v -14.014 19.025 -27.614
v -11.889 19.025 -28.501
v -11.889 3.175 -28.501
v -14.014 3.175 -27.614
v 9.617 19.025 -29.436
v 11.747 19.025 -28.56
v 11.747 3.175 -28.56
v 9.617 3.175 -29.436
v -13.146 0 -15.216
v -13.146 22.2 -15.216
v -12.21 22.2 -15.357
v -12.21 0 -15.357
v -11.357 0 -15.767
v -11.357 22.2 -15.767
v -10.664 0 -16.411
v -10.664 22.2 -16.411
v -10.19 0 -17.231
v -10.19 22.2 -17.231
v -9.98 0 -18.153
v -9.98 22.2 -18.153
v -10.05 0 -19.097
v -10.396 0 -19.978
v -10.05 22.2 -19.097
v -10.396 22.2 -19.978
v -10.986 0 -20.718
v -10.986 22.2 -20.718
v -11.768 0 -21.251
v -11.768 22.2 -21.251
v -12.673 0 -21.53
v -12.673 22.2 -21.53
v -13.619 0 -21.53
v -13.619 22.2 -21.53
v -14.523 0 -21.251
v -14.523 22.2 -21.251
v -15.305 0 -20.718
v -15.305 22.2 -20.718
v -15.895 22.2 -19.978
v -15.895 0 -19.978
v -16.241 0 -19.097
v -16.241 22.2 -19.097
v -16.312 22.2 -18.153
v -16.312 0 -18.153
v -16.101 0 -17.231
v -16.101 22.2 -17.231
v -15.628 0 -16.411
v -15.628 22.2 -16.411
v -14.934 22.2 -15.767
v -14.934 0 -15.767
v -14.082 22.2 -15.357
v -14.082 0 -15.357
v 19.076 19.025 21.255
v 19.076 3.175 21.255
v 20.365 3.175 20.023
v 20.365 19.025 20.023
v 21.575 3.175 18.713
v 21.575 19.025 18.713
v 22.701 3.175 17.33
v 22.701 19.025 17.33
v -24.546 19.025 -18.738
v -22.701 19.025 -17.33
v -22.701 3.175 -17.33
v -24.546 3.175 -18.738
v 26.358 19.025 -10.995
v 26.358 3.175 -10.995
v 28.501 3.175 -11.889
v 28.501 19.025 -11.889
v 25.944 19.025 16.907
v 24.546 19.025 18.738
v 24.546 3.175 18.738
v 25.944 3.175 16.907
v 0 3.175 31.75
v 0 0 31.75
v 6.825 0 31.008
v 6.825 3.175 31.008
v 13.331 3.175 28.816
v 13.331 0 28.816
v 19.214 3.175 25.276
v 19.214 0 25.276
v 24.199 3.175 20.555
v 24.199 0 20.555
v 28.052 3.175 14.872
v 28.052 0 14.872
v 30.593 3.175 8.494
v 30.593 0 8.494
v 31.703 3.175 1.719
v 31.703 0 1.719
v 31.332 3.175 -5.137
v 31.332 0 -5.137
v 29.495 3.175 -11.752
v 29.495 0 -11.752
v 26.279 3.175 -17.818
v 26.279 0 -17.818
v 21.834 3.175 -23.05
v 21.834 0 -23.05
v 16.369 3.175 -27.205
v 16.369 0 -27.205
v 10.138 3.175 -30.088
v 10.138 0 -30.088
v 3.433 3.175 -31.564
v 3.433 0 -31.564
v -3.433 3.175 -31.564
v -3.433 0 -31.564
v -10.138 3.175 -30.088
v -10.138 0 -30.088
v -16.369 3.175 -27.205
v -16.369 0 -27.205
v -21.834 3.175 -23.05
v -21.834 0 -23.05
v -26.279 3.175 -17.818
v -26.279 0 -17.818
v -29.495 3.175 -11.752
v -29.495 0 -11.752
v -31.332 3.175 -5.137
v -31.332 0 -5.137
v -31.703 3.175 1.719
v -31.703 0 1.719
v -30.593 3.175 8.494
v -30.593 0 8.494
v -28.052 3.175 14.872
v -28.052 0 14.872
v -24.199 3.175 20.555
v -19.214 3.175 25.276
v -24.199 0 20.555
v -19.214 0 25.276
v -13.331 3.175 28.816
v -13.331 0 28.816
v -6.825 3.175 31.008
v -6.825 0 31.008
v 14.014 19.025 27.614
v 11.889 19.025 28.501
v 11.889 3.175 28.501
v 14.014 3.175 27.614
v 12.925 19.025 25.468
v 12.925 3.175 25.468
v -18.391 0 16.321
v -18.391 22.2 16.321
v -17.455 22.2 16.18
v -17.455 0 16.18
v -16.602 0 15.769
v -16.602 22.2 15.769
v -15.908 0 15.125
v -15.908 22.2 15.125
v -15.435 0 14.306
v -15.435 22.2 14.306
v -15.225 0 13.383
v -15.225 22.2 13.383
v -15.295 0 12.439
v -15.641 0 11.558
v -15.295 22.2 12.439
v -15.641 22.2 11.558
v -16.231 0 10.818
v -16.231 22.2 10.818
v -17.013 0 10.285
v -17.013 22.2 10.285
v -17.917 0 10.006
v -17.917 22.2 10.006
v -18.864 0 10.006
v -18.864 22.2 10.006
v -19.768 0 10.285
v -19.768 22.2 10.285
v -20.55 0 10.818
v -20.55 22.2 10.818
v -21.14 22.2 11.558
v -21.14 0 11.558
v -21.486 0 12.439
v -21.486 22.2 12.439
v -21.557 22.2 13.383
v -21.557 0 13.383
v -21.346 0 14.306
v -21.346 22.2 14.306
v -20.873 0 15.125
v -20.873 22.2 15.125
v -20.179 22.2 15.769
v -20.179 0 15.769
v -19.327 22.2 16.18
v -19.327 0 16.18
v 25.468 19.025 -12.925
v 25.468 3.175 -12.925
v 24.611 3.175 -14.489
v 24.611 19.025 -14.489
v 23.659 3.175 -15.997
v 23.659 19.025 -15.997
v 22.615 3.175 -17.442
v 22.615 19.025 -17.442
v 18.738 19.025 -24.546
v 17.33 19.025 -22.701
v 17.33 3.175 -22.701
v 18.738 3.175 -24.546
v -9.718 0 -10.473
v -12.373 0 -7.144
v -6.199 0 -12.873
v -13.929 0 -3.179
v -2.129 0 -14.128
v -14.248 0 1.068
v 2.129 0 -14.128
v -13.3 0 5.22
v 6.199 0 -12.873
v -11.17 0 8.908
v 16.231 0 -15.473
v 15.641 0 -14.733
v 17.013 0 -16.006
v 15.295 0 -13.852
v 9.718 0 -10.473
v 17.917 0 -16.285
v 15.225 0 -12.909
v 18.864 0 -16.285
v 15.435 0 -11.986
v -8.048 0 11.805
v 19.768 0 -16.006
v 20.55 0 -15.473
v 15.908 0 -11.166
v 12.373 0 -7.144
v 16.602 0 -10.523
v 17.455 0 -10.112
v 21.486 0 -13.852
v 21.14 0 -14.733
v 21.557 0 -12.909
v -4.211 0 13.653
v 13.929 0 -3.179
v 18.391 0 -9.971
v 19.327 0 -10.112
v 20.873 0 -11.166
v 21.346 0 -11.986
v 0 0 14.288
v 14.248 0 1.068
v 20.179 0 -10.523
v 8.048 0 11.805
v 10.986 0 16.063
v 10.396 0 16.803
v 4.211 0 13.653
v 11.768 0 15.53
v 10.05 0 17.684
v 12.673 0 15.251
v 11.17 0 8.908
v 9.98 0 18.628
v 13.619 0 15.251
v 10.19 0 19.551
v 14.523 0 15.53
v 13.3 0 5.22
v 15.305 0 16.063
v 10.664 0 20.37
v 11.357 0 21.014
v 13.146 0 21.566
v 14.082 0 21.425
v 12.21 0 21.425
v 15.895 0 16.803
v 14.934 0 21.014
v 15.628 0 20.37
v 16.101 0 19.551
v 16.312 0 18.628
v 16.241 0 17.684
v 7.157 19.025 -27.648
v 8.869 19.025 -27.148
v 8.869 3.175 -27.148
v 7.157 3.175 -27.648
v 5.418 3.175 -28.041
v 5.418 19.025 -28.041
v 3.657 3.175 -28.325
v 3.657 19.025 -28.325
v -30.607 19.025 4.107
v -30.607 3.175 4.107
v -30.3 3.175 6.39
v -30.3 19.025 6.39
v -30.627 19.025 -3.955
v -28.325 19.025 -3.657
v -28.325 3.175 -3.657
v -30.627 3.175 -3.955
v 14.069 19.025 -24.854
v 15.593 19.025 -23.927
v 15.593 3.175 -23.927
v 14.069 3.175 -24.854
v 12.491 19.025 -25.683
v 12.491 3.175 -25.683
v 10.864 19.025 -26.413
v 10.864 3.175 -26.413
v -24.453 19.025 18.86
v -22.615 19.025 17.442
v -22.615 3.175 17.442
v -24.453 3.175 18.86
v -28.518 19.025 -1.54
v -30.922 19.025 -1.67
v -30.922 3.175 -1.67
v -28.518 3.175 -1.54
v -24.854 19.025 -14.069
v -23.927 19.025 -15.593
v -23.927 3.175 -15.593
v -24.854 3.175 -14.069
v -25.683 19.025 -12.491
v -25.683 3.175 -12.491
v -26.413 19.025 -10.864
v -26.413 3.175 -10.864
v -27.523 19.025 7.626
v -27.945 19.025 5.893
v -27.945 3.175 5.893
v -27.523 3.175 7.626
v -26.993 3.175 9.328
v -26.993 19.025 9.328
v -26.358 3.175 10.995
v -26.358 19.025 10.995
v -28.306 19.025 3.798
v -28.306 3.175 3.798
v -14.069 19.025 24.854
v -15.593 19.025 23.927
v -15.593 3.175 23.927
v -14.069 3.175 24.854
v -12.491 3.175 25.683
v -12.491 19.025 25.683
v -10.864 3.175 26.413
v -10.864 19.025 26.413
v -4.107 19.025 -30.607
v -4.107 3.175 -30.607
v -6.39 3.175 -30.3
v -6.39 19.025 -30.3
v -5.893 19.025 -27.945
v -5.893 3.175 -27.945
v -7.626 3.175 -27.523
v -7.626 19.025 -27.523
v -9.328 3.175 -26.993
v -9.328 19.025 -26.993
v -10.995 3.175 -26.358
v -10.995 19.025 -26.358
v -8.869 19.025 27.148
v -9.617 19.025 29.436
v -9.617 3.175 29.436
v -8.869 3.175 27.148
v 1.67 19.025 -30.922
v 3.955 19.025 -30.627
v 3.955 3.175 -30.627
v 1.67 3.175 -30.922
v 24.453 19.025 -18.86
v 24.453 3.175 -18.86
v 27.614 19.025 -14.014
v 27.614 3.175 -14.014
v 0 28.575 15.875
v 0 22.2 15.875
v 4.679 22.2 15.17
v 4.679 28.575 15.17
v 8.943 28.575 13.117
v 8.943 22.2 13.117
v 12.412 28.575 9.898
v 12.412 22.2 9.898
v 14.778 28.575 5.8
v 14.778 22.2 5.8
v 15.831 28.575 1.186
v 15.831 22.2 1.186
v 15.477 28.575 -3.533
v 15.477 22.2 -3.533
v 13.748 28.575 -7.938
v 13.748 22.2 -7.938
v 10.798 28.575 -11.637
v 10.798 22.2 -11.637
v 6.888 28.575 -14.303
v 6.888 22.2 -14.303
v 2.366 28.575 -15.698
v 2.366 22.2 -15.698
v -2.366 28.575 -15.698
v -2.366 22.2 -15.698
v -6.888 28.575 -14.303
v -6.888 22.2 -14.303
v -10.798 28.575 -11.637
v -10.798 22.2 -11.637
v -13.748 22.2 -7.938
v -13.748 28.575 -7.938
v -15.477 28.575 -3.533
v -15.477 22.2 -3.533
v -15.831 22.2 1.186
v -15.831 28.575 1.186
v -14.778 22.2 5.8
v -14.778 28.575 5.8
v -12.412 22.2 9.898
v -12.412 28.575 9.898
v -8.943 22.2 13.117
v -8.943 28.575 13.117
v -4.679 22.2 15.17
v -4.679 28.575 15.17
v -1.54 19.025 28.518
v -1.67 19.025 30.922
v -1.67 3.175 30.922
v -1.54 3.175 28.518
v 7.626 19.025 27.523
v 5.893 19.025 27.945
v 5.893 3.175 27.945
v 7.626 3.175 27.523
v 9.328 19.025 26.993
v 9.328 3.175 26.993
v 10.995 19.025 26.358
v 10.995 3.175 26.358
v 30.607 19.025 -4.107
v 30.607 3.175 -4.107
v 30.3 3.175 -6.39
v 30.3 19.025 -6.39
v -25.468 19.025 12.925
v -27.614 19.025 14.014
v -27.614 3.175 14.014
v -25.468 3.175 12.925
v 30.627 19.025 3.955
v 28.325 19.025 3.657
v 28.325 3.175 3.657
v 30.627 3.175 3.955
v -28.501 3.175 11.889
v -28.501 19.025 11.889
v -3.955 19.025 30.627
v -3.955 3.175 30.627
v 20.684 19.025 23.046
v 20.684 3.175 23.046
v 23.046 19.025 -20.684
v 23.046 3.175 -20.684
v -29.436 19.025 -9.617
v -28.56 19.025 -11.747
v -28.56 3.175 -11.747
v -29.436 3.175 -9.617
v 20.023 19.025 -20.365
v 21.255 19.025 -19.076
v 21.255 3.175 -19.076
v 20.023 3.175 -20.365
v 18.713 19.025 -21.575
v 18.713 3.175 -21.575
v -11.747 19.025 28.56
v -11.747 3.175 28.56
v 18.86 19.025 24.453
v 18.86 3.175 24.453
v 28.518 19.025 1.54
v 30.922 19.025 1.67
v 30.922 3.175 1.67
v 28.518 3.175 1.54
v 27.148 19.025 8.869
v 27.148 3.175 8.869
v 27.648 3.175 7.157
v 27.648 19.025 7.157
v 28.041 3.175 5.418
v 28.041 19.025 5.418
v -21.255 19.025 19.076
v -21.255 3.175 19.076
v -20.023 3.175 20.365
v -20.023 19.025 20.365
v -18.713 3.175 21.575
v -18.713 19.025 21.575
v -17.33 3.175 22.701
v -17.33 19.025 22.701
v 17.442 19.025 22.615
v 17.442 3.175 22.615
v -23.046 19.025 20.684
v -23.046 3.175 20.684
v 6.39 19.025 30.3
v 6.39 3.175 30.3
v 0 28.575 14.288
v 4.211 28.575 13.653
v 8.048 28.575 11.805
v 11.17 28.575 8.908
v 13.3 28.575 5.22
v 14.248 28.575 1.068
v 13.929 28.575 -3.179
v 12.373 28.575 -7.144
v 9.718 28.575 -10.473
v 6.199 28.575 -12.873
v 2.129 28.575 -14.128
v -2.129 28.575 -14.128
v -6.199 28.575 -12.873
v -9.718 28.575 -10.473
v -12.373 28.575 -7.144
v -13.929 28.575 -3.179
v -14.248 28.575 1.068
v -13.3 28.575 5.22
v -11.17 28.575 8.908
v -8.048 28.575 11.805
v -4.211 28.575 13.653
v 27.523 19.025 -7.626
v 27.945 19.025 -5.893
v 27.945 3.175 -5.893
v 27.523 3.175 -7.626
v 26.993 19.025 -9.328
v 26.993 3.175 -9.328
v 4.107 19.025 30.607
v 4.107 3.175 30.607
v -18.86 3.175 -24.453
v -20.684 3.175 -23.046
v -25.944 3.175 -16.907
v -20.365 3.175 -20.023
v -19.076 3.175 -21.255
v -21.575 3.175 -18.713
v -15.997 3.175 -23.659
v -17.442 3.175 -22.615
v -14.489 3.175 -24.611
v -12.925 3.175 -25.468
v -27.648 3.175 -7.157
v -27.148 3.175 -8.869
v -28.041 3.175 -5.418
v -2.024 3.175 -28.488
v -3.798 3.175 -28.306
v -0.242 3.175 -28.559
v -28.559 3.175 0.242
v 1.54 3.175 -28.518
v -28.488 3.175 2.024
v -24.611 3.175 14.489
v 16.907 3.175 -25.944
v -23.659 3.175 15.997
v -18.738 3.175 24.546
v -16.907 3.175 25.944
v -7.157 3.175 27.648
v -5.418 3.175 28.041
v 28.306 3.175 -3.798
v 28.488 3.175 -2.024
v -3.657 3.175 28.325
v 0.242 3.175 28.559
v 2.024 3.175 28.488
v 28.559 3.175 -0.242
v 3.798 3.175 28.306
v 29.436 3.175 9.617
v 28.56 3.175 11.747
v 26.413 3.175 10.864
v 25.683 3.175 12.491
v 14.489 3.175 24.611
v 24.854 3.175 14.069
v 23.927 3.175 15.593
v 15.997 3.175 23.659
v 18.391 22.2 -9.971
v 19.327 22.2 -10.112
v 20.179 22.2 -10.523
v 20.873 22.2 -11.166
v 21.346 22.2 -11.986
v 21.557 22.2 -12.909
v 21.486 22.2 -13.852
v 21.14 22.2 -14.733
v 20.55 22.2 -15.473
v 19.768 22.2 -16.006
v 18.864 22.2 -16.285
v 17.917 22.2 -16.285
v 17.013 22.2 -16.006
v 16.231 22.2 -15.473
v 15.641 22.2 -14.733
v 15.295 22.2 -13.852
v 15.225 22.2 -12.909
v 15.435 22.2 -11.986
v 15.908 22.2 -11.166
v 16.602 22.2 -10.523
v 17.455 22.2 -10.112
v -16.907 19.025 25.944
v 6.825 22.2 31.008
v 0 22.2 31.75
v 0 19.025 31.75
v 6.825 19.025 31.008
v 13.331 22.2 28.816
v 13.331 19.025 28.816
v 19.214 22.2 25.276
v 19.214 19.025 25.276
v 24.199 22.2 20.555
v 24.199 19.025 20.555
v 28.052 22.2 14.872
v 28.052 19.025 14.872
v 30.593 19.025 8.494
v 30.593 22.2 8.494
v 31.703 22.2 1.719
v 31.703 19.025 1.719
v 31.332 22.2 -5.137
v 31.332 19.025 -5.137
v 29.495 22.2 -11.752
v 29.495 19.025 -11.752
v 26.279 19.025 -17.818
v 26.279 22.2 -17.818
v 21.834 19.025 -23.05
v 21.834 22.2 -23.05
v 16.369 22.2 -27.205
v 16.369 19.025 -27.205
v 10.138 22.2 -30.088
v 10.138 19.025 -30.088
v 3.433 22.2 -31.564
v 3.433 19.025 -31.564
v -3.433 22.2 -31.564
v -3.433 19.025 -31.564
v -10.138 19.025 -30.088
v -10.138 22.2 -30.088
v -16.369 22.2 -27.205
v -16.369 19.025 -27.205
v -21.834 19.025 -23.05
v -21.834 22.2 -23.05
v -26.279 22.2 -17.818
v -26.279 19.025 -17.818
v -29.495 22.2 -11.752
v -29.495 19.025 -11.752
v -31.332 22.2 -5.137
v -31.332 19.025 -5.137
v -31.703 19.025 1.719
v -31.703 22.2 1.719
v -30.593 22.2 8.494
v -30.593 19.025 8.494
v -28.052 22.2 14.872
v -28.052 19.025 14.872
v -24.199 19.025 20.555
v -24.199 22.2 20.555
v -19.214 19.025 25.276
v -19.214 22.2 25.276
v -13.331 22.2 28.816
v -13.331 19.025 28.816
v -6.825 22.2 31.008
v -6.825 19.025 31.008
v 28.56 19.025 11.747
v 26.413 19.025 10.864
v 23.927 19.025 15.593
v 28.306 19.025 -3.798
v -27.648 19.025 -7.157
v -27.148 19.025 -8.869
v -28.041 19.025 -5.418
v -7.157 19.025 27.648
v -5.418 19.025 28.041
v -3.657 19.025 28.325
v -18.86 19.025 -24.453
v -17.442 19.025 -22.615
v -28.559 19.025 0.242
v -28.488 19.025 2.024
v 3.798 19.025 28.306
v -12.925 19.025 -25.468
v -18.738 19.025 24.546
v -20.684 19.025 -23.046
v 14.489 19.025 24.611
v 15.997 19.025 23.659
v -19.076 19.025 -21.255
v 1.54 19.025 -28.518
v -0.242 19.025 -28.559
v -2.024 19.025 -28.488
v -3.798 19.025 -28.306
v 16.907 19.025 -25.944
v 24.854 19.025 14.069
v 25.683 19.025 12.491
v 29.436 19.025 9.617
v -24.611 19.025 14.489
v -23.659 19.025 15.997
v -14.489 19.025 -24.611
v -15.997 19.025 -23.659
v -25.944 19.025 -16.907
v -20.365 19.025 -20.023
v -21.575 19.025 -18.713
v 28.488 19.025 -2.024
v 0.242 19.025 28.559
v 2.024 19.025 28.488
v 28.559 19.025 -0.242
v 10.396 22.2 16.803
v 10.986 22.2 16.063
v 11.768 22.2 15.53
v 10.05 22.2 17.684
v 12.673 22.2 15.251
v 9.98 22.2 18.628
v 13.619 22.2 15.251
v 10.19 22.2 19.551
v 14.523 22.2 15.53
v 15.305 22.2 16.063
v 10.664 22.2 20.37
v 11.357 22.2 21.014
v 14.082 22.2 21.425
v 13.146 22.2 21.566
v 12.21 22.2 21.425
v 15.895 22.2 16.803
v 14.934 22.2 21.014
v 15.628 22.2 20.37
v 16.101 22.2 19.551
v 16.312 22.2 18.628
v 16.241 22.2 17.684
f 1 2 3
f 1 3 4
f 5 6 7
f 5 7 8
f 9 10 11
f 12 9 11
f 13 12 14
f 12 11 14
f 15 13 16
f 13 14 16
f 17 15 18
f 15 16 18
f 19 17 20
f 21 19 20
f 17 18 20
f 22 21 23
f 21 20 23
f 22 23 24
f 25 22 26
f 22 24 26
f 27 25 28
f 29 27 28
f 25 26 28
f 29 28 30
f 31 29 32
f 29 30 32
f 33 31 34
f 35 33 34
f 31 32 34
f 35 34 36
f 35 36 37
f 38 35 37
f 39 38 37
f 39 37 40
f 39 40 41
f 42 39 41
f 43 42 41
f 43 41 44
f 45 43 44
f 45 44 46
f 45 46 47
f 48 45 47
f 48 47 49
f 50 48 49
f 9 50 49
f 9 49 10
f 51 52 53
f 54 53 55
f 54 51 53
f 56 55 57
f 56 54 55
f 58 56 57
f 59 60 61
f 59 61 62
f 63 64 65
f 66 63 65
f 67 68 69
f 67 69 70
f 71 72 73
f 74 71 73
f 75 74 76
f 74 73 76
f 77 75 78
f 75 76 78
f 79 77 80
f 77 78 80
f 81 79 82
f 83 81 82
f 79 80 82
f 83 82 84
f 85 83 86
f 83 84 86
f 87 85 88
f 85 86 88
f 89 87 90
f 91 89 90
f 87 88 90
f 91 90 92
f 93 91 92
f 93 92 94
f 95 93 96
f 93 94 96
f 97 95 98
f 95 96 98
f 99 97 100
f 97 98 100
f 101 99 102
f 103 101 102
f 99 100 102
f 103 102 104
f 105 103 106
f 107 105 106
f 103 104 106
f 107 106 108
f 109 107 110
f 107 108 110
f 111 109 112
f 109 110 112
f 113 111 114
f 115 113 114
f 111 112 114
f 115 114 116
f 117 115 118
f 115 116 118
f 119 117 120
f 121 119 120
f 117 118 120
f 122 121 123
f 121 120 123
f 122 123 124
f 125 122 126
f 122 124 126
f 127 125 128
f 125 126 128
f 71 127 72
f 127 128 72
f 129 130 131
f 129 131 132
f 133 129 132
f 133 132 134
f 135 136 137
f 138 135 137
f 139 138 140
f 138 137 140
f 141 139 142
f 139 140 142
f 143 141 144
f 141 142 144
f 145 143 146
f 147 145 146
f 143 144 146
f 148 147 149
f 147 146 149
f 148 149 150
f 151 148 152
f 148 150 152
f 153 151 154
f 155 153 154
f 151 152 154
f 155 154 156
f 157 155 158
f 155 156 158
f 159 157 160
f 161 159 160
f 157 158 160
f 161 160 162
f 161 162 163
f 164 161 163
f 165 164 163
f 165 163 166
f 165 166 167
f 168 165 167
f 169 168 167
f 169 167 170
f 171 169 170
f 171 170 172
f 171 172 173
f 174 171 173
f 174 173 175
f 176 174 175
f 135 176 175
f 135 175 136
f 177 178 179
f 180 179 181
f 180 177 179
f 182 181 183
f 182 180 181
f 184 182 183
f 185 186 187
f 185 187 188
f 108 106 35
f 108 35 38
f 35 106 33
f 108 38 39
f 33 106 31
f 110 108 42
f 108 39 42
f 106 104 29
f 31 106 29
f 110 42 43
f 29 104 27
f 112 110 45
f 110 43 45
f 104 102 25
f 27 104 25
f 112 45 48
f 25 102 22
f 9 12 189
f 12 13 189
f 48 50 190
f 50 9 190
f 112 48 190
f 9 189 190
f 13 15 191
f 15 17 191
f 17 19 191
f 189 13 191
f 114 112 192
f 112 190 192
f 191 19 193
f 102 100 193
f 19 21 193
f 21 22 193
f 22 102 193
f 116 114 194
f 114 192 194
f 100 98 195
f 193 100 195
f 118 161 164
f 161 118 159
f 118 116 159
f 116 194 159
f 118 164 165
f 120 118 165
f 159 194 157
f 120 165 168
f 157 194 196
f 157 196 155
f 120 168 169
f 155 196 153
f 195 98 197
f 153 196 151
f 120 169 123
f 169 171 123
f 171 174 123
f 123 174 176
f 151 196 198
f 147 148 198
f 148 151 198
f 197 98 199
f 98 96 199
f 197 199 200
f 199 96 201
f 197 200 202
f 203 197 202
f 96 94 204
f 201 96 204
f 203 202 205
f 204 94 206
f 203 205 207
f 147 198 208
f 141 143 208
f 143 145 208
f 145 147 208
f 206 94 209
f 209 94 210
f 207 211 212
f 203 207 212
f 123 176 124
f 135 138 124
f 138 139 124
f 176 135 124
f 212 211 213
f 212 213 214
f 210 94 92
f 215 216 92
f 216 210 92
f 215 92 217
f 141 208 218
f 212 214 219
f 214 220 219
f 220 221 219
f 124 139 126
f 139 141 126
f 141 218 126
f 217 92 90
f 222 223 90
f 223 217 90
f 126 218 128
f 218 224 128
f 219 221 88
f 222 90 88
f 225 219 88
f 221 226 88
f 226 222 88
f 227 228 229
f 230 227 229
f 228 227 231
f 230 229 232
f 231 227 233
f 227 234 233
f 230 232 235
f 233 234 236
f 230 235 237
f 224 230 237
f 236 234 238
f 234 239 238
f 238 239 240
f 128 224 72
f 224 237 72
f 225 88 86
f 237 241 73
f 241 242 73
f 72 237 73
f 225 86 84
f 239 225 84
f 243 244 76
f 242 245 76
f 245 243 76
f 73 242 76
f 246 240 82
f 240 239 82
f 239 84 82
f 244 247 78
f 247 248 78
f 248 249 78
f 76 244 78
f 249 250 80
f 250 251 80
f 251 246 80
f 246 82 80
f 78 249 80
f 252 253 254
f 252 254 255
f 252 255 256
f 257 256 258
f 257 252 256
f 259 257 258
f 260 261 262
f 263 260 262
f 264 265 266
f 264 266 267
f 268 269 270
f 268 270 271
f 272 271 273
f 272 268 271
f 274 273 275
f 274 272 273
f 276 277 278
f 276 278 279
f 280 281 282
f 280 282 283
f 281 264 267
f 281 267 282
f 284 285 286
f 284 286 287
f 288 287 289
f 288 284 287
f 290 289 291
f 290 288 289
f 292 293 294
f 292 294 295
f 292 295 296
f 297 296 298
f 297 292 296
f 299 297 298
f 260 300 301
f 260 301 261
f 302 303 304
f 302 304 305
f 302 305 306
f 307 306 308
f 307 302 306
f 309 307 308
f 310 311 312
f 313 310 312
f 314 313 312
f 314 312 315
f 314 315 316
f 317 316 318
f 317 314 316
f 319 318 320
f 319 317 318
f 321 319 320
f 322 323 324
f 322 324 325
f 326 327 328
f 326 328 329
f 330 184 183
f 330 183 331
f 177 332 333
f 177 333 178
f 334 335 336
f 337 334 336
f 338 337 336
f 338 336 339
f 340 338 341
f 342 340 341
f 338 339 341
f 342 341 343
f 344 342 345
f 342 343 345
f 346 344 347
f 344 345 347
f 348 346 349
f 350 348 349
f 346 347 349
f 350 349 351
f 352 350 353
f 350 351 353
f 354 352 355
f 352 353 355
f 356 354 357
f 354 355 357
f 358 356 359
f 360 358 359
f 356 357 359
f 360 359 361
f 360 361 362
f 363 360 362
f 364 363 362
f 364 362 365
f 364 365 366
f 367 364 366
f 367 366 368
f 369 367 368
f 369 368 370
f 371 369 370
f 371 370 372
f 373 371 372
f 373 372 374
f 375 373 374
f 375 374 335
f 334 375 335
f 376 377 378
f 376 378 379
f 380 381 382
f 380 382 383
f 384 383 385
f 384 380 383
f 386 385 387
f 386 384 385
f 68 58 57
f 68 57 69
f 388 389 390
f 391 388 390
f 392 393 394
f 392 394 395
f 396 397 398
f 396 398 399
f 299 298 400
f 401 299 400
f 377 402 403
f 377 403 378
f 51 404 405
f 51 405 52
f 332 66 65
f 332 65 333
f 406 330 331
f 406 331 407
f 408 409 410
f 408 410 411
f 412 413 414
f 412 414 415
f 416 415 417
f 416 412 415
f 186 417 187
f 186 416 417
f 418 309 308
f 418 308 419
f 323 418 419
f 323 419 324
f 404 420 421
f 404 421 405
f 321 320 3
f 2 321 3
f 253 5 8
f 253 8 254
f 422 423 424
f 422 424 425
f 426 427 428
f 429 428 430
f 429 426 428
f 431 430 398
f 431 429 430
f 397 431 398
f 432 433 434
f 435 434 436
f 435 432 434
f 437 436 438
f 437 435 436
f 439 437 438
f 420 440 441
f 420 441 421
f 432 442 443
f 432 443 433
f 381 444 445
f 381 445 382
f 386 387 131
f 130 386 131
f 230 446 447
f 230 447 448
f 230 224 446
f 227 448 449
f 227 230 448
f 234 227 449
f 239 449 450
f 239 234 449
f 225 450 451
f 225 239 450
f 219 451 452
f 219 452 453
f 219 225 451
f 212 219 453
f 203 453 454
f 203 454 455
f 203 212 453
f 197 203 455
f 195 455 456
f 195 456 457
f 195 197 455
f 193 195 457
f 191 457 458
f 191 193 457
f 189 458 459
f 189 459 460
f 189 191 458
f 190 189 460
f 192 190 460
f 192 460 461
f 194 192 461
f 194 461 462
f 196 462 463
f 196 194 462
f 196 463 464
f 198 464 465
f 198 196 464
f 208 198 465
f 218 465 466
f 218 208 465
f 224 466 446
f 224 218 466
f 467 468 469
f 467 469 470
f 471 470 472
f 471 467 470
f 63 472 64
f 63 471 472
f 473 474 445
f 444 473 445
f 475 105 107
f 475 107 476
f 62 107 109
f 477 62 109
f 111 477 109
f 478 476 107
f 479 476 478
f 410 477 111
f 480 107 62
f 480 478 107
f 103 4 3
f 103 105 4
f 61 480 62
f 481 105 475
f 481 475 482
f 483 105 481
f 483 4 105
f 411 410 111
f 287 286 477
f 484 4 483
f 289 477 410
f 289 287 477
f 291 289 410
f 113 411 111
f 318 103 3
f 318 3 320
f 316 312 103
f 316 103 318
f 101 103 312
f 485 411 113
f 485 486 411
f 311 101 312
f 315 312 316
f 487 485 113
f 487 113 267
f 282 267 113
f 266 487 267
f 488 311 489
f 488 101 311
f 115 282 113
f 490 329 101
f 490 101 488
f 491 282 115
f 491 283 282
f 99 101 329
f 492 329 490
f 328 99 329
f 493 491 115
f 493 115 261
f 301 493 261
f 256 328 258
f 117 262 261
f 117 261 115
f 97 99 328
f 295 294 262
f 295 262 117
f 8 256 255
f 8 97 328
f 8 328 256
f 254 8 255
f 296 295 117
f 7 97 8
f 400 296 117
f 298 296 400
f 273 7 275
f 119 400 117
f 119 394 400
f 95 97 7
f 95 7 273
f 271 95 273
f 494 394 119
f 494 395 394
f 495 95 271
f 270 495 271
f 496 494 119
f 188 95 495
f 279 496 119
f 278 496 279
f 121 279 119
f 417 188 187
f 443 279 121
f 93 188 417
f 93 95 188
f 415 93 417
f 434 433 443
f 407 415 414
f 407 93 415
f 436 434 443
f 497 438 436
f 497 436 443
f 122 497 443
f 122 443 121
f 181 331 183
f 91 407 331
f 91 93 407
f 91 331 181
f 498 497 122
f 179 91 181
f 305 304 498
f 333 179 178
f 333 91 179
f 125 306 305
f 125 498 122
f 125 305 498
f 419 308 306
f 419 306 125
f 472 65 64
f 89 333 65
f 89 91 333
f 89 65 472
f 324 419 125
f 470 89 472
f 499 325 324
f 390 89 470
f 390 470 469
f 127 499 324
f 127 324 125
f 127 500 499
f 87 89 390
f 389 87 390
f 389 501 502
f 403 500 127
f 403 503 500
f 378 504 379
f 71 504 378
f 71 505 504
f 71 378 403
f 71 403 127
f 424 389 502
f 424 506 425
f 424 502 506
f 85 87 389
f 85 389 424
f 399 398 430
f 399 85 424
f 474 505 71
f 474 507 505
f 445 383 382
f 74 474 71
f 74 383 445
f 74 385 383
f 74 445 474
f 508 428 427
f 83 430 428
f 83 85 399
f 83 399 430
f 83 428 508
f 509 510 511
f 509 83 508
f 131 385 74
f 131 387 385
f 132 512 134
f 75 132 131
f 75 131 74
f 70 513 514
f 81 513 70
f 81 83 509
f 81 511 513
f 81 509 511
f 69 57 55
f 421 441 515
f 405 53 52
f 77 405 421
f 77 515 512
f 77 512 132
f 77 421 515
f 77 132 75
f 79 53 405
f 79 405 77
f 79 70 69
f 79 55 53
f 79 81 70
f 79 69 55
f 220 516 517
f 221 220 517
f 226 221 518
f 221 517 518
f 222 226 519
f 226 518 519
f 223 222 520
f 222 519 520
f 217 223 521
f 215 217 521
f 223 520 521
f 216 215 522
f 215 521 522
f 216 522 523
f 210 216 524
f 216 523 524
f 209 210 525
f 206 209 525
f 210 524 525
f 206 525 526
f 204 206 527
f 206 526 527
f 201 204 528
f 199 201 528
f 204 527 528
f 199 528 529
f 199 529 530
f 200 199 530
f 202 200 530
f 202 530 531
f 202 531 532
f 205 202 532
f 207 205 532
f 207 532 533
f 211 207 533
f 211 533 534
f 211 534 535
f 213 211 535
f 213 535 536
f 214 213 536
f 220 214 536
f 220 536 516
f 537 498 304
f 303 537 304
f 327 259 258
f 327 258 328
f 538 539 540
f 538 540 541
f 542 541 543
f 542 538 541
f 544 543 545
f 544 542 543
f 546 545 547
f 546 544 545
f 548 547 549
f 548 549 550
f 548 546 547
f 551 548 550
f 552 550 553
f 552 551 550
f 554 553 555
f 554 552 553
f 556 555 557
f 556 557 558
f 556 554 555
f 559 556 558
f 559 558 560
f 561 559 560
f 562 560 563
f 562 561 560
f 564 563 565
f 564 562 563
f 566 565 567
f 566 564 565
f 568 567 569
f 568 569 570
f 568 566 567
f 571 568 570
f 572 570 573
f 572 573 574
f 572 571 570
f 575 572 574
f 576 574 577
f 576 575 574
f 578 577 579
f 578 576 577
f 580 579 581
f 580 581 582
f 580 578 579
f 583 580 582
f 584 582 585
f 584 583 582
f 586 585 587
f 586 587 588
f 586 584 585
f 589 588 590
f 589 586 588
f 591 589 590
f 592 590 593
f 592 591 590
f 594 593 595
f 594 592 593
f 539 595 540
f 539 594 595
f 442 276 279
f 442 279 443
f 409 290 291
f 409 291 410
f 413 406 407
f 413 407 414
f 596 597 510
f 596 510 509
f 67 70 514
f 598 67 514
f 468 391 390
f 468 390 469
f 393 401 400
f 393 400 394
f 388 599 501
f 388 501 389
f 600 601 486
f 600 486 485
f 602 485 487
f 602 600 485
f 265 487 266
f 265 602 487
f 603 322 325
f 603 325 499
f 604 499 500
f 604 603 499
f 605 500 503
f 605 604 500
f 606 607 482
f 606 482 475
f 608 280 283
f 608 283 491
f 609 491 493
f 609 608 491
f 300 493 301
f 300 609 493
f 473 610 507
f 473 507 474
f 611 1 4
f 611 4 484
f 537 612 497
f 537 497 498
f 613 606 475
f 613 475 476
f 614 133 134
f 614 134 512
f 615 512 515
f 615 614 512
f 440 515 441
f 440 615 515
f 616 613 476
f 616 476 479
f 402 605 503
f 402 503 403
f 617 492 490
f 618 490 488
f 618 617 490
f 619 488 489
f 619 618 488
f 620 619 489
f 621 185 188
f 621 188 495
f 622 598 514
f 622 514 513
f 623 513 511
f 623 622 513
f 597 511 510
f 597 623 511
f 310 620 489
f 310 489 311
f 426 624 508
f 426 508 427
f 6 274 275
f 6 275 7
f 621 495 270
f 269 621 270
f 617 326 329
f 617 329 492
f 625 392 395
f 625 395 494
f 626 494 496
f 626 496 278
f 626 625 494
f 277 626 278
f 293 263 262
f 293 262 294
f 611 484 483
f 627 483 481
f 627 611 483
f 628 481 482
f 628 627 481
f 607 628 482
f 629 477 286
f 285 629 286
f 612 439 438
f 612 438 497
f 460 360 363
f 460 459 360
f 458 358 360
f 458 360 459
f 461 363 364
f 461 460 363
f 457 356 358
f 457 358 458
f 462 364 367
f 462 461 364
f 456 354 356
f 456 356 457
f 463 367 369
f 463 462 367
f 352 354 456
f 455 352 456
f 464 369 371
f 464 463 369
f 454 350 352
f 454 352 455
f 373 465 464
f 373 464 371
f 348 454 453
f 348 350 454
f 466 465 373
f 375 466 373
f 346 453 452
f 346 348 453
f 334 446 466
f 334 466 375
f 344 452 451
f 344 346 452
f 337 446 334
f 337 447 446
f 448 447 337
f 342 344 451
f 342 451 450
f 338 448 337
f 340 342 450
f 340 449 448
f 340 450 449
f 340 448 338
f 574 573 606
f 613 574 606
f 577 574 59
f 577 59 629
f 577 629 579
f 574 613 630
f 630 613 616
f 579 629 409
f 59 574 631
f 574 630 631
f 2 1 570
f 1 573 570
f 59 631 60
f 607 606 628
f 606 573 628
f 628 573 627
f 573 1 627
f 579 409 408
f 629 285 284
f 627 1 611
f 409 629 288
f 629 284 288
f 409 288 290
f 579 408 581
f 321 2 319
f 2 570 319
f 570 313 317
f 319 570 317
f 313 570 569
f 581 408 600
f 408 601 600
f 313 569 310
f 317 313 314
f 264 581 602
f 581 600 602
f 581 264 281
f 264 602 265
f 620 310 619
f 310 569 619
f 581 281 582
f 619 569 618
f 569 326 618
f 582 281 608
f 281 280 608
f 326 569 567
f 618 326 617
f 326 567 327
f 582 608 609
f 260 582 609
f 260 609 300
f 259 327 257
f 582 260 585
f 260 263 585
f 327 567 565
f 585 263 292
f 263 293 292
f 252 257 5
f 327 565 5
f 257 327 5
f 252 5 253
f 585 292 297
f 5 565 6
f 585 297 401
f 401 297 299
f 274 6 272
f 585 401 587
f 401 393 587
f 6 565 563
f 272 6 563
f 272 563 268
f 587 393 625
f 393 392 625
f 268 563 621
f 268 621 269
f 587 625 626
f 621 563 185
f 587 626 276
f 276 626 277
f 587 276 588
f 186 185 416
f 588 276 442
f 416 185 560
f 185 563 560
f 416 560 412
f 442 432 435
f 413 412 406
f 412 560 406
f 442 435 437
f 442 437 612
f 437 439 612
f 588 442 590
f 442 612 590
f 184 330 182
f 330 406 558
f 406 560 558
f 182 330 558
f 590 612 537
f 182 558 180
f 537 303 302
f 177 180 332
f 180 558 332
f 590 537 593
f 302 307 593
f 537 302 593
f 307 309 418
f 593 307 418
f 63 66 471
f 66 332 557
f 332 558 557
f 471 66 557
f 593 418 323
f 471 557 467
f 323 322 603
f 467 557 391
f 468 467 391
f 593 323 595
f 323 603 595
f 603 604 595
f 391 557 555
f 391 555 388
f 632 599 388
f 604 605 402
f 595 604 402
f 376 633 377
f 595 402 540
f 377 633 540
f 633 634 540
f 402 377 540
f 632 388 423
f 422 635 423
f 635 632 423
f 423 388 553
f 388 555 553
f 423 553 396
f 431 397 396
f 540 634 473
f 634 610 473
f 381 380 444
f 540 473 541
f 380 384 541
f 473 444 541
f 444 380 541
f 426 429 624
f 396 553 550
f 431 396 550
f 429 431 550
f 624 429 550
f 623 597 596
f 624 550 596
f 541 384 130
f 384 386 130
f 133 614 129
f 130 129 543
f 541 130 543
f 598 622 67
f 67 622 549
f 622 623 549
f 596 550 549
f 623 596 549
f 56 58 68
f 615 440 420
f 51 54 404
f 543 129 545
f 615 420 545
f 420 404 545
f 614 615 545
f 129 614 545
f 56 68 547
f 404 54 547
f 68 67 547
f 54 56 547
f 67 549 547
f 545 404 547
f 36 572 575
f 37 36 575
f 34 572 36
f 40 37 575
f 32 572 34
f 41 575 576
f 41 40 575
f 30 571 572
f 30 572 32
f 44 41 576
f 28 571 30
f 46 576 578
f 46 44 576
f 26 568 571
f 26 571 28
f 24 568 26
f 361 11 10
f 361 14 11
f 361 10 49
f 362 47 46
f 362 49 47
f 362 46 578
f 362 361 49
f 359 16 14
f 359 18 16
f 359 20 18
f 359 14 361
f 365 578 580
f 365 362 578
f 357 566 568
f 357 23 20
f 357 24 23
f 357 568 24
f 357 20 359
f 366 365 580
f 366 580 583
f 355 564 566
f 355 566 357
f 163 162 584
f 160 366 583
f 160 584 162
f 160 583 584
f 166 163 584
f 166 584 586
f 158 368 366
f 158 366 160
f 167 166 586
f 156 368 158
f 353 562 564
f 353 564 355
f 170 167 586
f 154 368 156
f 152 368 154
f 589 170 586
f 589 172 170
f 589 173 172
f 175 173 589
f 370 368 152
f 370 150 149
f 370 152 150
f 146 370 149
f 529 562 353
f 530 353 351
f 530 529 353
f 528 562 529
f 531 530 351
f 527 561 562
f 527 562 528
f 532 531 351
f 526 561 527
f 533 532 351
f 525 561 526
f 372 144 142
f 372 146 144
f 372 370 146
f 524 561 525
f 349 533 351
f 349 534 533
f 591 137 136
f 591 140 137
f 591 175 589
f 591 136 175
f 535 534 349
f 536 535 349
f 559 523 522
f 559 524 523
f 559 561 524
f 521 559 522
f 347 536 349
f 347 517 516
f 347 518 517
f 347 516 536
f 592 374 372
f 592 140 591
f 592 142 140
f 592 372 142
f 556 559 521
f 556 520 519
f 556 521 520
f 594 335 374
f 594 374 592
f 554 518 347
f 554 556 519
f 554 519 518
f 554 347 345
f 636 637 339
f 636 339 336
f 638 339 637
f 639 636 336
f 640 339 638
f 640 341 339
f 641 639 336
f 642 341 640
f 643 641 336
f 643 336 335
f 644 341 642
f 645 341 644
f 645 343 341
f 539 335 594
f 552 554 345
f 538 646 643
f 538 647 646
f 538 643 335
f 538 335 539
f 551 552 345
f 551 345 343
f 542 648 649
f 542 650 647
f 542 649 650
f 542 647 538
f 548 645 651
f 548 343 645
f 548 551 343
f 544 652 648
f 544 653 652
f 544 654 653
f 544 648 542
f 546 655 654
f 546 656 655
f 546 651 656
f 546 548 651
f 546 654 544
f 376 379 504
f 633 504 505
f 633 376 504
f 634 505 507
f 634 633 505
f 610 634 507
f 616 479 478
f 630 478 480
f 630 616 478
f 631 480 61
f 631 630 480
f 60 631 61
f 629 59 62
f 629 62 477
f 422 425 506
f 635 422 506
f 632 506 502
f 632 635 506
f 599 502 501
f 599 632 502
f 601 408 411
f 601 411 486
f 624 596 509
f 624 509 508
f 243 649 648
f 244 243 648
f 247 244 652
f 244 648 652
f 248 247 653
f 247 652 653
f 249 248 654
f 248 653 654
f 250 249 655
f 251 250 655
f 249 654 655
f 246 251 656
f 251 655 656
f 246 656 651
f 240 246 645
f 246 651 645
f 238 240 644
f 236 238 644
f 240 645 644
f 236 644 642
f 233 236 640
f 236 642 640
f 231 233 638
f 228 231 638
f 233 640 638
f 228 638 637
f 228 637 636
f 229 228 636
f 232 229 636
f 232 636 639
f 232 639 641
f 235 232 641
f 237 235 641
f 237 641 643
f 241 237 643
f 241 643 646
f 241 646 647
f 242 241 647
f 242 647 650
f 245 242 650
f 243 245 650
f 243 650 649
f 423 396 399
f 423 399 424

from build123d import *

# Parameters (mm, degrees)
SKETCH1_R           = 31.75
SKETCH1_R_2         = 14.2875
BOSS_EXTRUDE1_DEPTH = 3.175
SKETCH2_R           = 15.875
SKETCH2_R_2         = 14.2875
BOSS_EXTRUDE2_DEPTH = 25.4
SKETCH3_R           = 3.175
CUT_EXTRUDE1_DEPTH  = 25.4
BOSS_EXTRUDE3_START = 15.8496
SKETCH4_R           = 3.175
SKETCH4_R_2         = 15.875
BOSS_EXTRUDE3_DEPTH = 15.8496
BOSS_EXTRUDE4_START = 15.875
BOSS_EXTRUDE4_DEPTH = 15.875
BOSS_EXTRUDE5_START = 3.175
SKETCH5_R           = 31.75
SKETCH5_R_2         = 15.875
SKETCH5_R_3         = 3.175
BOSS_EXTRUDE5_DEPTH = 3.175


with BuildPart() as part:
    # Sketch1 → Boss-Extrude1 (new body)
    with BuildSketch(Plane(origin=(0, 0, 0), x_dir=(1, 0, 0), z_dir=(0, 1, 0))):
        Circle(SKETCH1_R)
        Circle(SKETCH1_R_2, mode=Mode.SUBTRACT)
    extrude(amount=BOSS_EXTRUDE1_DEPTH)

    # Sketch2 → Boss-Extrude2 (add)
    with BuildSketch(Plane(origin=(0, 3.175, 0), x_dir=(1, 0, 0), z_dir=(0, 1, 0))):
        Circle(SKETCH2_R)
        Circle(SKETCH2_R_2, mode=Mode.SUBTRACT)
    extrude(amount=BOSS_EXTRUDE2_DEPTH)

    # Sketch3 → Cut-Extrude1 (cut)
    with BuildSketch(Plane(origin=(0, 3.175, 0), x_dir=(1, 0, 0), z_dir=(0, 1, 0))):
        with Locations((-18.390705049, -13.145843594)):
            Circle(SKETCH3_R)
        with Locations((-13.145843594, 18.390705049)):
            Circle(SKETCH3_R)
        with Locations((18.390705049, 13.145843594)):
            Circle(SKETCH3_R)
        with Locations((13.145843594, -18.390705049)):
            Circle(SKETCH3_R)
    extrude(amount=-CUT_EXTRUDE1_DEPTH, mode=Mode.SUBTRACT)

    # Sketch4 → Boss-Extrude3 (add)
    with BuildSketch(Plane(origin=(0, 3.175, 0), x_dir=(1, 0, 0), z_dir=(0, 1, 0)).offset(BOSS_EXTRUDE3_START)):
        with BuildLine():
            ThreePointArc((-15.593126517, -23.927184529), (-13.286641881, -25.280840603), (-10.863650415, -26.412816089))
            ThreePointArc((-10.863650415, -26.412816089), (-9.873160958, -26.798814279), (-8.868992564, -27.147683603))
            ThreePointArc((-8.868992564, -27.147683603), (-6.290747513, -27.858252813), (-3.657340665, -28.324540832))
            ThreePointArc((-3.657340665, -28.324540832), (-2.600697634, -28.441028918), (-1.540451424, -28.518112902))
            ThreePointArc((-1.540451424, -28.518112902), (1.133850902, -28.537171132), (3.798210807, -28.305994926))
            ThreePointArc((3.798210807, -28.305994926), (4.848998935, -28.145034436), (5.893068935, -27.945079936))
            ThreePointArc((5.893068935, -27.945079936), (8.481179251, -27.271328398), (10.99492049, -26.358442244))
            ThreePointArc((10.99492049, -26.358442244), (11.96824424, -25.93100237), (12.924986385, -25.467635953))
            ThreePointArc((12.924986385, -25.467635953), (15.250529251, -24.146989701), (17.442344511, -22.614605282))
            ThreePointArc((17.442344511, -22.614605282), (18.271873478, -21.949815345), (19.076087372, -21.254614667))
            ThreePointArc((19.076087372, -21.254614667), (20.980580885, -19.377073562), (22.701101578, -17.329620342))
            ThreePointArc((22.701101578, -17.329620342), (23.330304735, -16.472784678), (23.927184529, -15.593126517))
            ThreePointArc((23.927184529, -15.593126517), (25.280840603, -13.286641881), (26.412816089, -10.863650415))
            ThreePointArc((26.412816089, -10.863650415), (26.798814279, -9.873160958), (27.147683603, -8.868992564))
            ThreePointArc((27.147683603, -8.868992564), (27.858252813, -6.290747513), (28.324540832, -3.657340665))
            ThreePointArc((28.324540832, -3.657340665), (28.441028918, -2.600697634), (28.518112902, -1.540451424))
            ThreePointArc((28.518112902, -1.540451424), (28.549292011, -0.770506171), (28.55968757, 0))
            ThreePointArc((28.55968757, 0), (28.496193829, 1.903336892), (28.305994926, 3.798210807))
            ThreePointArc((28.305994926, 3.798210807), (28.145034436, 4.848998935), (27.945079936, 5.893068935))
            ThreePointArc((27.945079936, 5.893068935), (27.271328398, 8.481179251), (26.358442244, 10.99492049))
            ThreePointArc((26.358442244, 10.99492049), (25.93100237, 11.96824424), (25.467635953, 12.924986385))
            ThreePointArc((25.467635953, 12.924986385), (24.146989701, 15.250529251), (22.614605282, 17.442344511))
            ThreePointArc((22.614605282, 17.442344511), (21.949815345, 18.271873478), (21.254614667, 19.076087372))
            ThreePointArc((21.254614667, 19.076087372), (19.377073562, 20.980580885), (17.329620342, 22.701101578))
            ThreePointArc((17.329620342, 22.701101578), (16.472784678, 23.330304735), (15.593126517, 23.927184529))
            ThreePointArc((15.593126517, 23.927184529), (13.286641881, 25.280840603), (10.863650415, 26.412816089))
            ThreePointArc((10.863650415, 26.412816089), (9.873160958, 26.798814279), (8.868992564, 27.147683603))
            ThreePointArc((8.868992564, 27.147683603), (6.290747513, 27.858252813), (3.657340665, 28.324540832))
            ThreePointArc((3.657340665, 28.324540832), (2.600697634, 28.441028918), (1.540451424, 28.518112902))
            ThreePointArc((1.540451424, 28.518112902), (-1.133850902, 28.537171132), (-3.798210807, 28.305994926))
            ThreePointArc((-3.798210807, 28.305994926), (-4.848998935, 28.145034436), (-5.893068935, 27.945079936))
            ThreePointArc((-5.893068935, 27.945079936), (-8.481179251, 27.271328398), (-10.99492049, 26.358442244))
            ThreePointArc((-10.99492049, 26.358442244), (-11.96824424, 25.93100237), (-12.924986385, 25.467635953))
            ThreePointArc((-12.924986385, 25.467635953), (-15.250529251, 24.146989701), (-17.442344511, 22.614605282))
            ThreePointArc((-17.442344511, 22.614605282), (-18.271873478, 21.949815345), (-19.076087372, 21.254614667))
            ThreePointArc((-19.076087372, 21.254614667), (-20.980580885, 19.377073562), (-22.701101578, 17.329620342))
            ThreePointArc((-22.701101578, 17.329620342), (-23.330304735, 16.472784678), (-23.927184529, 15.593126517))
            ThreePointArc((-23.927184529, 15.593126517), (-25.280840603, 13.286641881), (-26.412816089, 10.863650415))
            ThreePointArc((-26.412816089, 10.863650415), (-26.798814279, 9.873160958), (-27.147683603, 8.868992564))
            ThreePointArc((-27.147683603, 8.868992564), (-27.858252813, 6.290747513), (-28.324540832, 3.657340665))
            ThreePointArc((-28.324540832, 3.657340665), (-28.441028918, 2.600697634), (-28.518112902, 1.540451424))
            ThreePointArc((-28.518112902, 1.540451424), (-28.537171132, -1.133850902), (-28.305994926, -3.798210807))
            ThreePointArc((-28.305994926, -3.798210807), (-28.145034436, -4.848998935), (-27.945079936, -5.893068935))
            ThreePointArc((-27.945079936, -5.893068935), (-27.271328398, -8.481179251), (-26.358442244, -10.99492049))
            ThreePointArc((-26.358442244, -10.99492049), (-25.93100237, -11.96824424), (-25.467635953, -12.924986385))
            ThreePointArc((-25.467635953, -12.924986385), (-24.146989701, -15.250529251), (-22.614605282, -17.442344511))
            ThreePointArc((-22.614605282, -17.442344511), (-21.949815345, -18.271873478), (-21.254614667, -19.076087372))
            ThreePointArc((-21.254614667, -19.076087372), (-19.377073562, -20.980580885), (-17.329620342, -22.701101578))
            ThreePointArc((-17.329620342, -22.701101578), (-16.472784678, -23.330304735), (-15.593126517, -23.927184529))
        make_face()
        with Locations((-18.390705049, -13.145843594)):
            Circle(SKETCH4_R, mode=Mode.SUBTRACT)
        with Locations((13.145843594, -18.390705049)):
            Circle(SKETCH4_R, mode=Mode.SUBTRACT)
        Circle(SKETCH4_R_2, mode=Mode.SUBTRACT)
        with Locations((-13.145843594, 18.390705049)):
            Circle(SKETCH4_R, mode=Mode.SUBTRACT)
        with Locations((18.390705049, 13.145843594)):
            Circle(SKETCH4_R, mode=Mode.SUBTRACT)
    extrude(amount=-BOSS_EXTRUDE3_DEPTH)

    # Sketch4<9> → Boss-Extrude4 (add)
    with BuildSketch(Plane(origin=(0, 3.175, 0), x_dir=(1, 0, 0), z_dir=(0, 1, 0)).offset(BOSS_EXTRUDE4_START)):
        with BuildLine():
            ThreePointArc((-8.868992564, -27.147683603), (-9.873160958, -26.798814279), (-10.863650415, -26.412816089))
            Line((-10.863650415, -26.412816089), (-11.746663464, -28.55968757))
            Line((-11.746663464, -28.55968757), (-9.616514462, -29.435822625))
            Line((-9.616514462, -29.435822625), (-8.868992564, -27.147683603))
        make_face()
        with BuildLine():
            Line((-16.907391181, -25.943884202), (-15.593126517, -23.927184529))
            ThreePointArc((-15.593126517, -23.927184529), (-16.472784678, -23.330304735), (-17.329620342, -22.701101578))
            Line((-17.329620342, -22.701101578), (-18.738196677, -24.546279594))
            Line((-18.738196677, -24.546279594), (-16.907391181, -25.943884202))
        make_face()
        with BuildLine():
            ThreePointArc((-1.540451424, -28.518112902), (-2.600697634, -28.441028918), (-3.657340665, -28.324540832))
            Line((-3.657340665, -28.324540832), (-3.954614547, -30.626800035))
            Line((-3.954614547, -30.626800035), (-1.670288174, -30.921758382))
            Line((-1.670288174, -30.921758382), (-1.540451424, -28.518112902))
        make_face()
        with BuildLine():
            Line((-23.046057132, -20.683912944), (-21.254614667, -19.076087372))
            ThreePointArc((-21.254614667, -19.076087372), (-21.949815345, -18.271873478), (-22.614605282, -17.442344511))
            Line((-22.614605282, -17.442344511), (-24.452752754, -18.860083228))
            Line((-24.452752754, -18.860083228), (-23.046057132, -20.683912944))
        make_face()
        with BuildLine():
            ThreePointArc((5.893068935, -27.945079936), (4.848998935, -28.145034436), (3.798210807, -28.305994926))
            Line((3.798210807, -28.305994926), (4.106934816, -30.606746691))
            Line((4.106934816, -30.606746691), (6.389765493, -30.300427406))
            Line((6.389765493, -30.300427406), (5.893068935, -27.945079936))
        make_face()
        with BuildLine():
            Line((-27.614172375, -14.014367201), (-25.467635953, -12.924986385))
            ThreePointArc((-25.467635953, -12.924986385), (-25.93100237, -11.96824424), (-26.358442244, -10.99492049))
            Line((-26.358442244, -10.99492049), (-28.500894141, -11.888603358))
            Line((-28.500894141, -11.888603358), (-27.614172375, -14.014367201))
        make_face()
        with BuildLine():
            ThreePointArc((12.924986385, -25.467635953), (11.96824424, -25.93100237), (10.99492049, -26.358442244))
            Line((10.99492049, -26.358442244), (11.888603358, -28.500894141))
            Line((11.888603358, -28.500894141), (14.014367201, -27.614172375))
            Line((14.014367201, -27.614172375), (12.924986385, -25.467635953))
        make_face()
        with BuildLine():
            Line((-30.300427406, -6.389765493), (-27.945079936, -5.893068935))
            ThreePointArc((-27.945079936, -5.893068935), (-28.145034436, -4.848998935), (-28.305994926, -3.798210807))
            Line((-28.305994926, -3.798210807), (-30.606746691, -4.106934816))
            Line((-30.606746691, -4.106934816), (-30.300427406, -6.389765493))
        make_face()
        with BuildLine():
            ThreePointArc((19.076087372, -21.254614667), (18.271873478, -21.949815345), (17.442344511, -22.614605282))
            Line((17.442344511, -22.614605282), (18.860083228, -24.452752754))
            Line((18.860083228, -24.452752754), (20.683912944, -23.046057132))
            Line((20.683912944, -23.046057132), (19.076087372, -21.254614667))
        make_face()
        with BuildLine():
            Line((-30.921758382, 1.670288174), (-28.518112902, 1.540451424))
            ThreePointArc((-28.518112902, 1.540451424), (-28.441028918, 2.600697634), (-28.324540832, 3.657340665))
            Line((-28.324540832, 3.657340665), (-30.626800035, 3.954614547))
            Line((-30.626800035, 3.954614547), (-30.921758382, 1.670288174))
        make_face()
        with BuildLine():
            ThreePointArc((23.927184529, -15.593126517), (23.330304735, -16.472784678), (22.701101578, -17.329620342))
            Line((22.701101578, -17.329620342), (24.546279594, -18.738196677))
            Line((24.546279594, -18.738196677), (25.943884202, -16.907391181))
            Line((25.943884202, -16.907391181), (23.927184529, -15.593126517))
        make_face()
        with BuildLine():
            Line((-29.435822625, 9.616514462), (-27.147683603, 8.868992564))
            ThreePointArc((-27.147683603, 8.868992564), (-26.798814279, 9.873160958), (-26.412816089, 10.863650415))
            Line((-26.412816089, 10.863650415), (-28.55968757, 11.746663464))
            Line((-28.55968757, 11.746663464), (-29.435822625, 9.616514462))
        make_face()
        with BuildLine():
            ThreePointArc((27.147683603, -8.868992564), (26.798814279, -9.873160958), (26.412816089, -10.863650415))
            Line((26.412816089, -10.863650415), (28.55968757, -11.746663464))
            Line((28.55968757, -11.746663464), (29.435822625, -9.616514462))
            Line((29.435822625, -9.616514462), (27.147683603, -8.868992564))
        make_face()
        with BuildLine():
            Line((-25.943884202, 16.907391181), (-23.927184529, 15.593126517))
            ThreePointArc((-23.927184529, 15.593126517), (-23.330304735, 16.472784678), (-22.701101578, 17.329620342))
            Line((-22.701101578, 17.329620342), (-24.546279594, 18.738196677))
            Line((-24.546279594, 18.738196677), (-25.943884202, 16.907391181))
        make_face()
        with BuildLine():
            ThreePointArc((28.518112902, -1.540451424), (28.441028918, -2.600697634), (28.324540832, -3.657340665))
            Line((28.324540832, -3.657340665), (30.626800035, -3.954614547))
            Line((30.626800035, -3.954614547), (30.921758382, -1.670288174))
            Line((30.921758382, -1.670288174), (28.518112902, -1.540451424))
        make_face()
        with BuildLine():
            Line((-20.683912944, 23.046057132), (-19.076087372, 21.254614667))
            ThreePointArc((-19.076087372, 21.254614667), (-18.271873478, 21.949815345), (-17.442344511, 22.614605282))
            Line((-17.442344511, 22.614605282), (-18.860083228, 24.452752754))
            Line((-18.860083228, 24.452752754), (-20.683912944, 23.046057132))
        make_face()
        with BuildLine():
            Line((-14.014367201, 27.614172375), (-12.924986385, 25.467635953))
            ThreePointArc((-12.924986385, 25.467635953), (-11.96824424, 25.93100237), (-10.99492049, 26.358442244))
            Line((-10.99492049, 26.358442244), (-11.888603358, 28.500894141))
            Line((-11.888603358, 28.500894141), (-14.014367201, 27.614172375))
        make_face()
        with BuildLine():
            ThreePointArc((27.945079936, 5.893068935), (28.145034436, 4.848998935), (28.305994926, 3.798210807))
            Line((28.305994926, 3.798210807), (30.606746691, 4.106934816))
            Line((30.606746691, 4.106934816), (30.300427406, 6.389765493))
            Line((30.300427406, 6.389765493), (27.945079936, 5.893068935))
        make_face()
        with BuildLine():
            Line((-6.389765493, 30.300427406), (-5.893068935, 27.945079936))
            ThreePointArc((-5.893068935, 27.945079936), (-4.848998935, 28.145034436), (-3.798210807, 28.305994926))
            Line((-3.798210807, 28.305994926), (-4.106934816, 30.606746691))
            Line((-4.106934816, 30.606746691), (-6.389765493, 30.300427406))
        make_face()
        with BuildLine():
            ThreePointArc((25.467635953, 12.924986385), (25.93100237, 11.96824424), (26.358442244, 10.99492049))
            Line((26.358442244, 10.99492049), (28.500894141, 11.888603358))
            Line((28.500894141, 11.888603358), (27.614172375, 14.014367201))
            Line((27.614172375, 14.014367201), (25.467635953, 12.924986385))
        make_face()
        with BuildLine():
            Line((1.670288174, 30.921758382), (1.540451424, 28.518112902))
            ThreePointArc((1.540451424, 28.518112902), (2.600697634, 28.441028918), (3.657340665, 28.324540832))
            Line((3.657340665, 28.324540832), (3.954614547, 30.626800035))
            Line((3.954614547, 30.626800035), (1.670288174, 30.921758382))
        make_face()
        with BuildLine():
            ThreePointArc((21.254614667, 19.076087372), (21.949815345, 18.271873478), (22.614605282, 17.442344511))
            Line((22.614605282, 17.442344511), (24.452752754, 18.860083228))
            Line((24.452752754, 18.860083228), (23.046057132, 20.683912944))
            Line((23.046057132, 20.683912944), (21.254614667, 19.076087372))
        make_face()
        with BuildLine():
            Line((9.616514462, 29.435822625), (8.868992564, 27.147683603))
            ThreePointArc((8.868992564, 27.147683603), (9.873160958, 26.798814279), (10.863650415, 26.412816089))
            Line((10.863650415, 26.412816089), (11.746663464, 28.55968757))
            Line((11.746663464, 28.55968757), (9.616514462, 29.435822625))
        make_face()
        with BuildLine():
            ThreePointArc((15.593126517, 23.927184529), (16.472784678, 23.330304735), (17.329620342, 22.701101578))
            Line((17.329620342, 22.701101578), (18.738196677, 24.546279594))
            Line((18.738196677, 24.546279594), (16.907391181, 25.943884202))
            Line((16.907391181, 25.943884202), (15.593126517, 23.927184529))
        make_face()
    extrude(amount=-BOSS_EXTRUDE4_DEPTH)

    # Sketch5 → Boss-Extrude5 (add)
    with BuildSketch(Plane(origin=(0, 19.0246, 0), x_dir=(1, 0, 0), z_dir=(0, 1, 0)).offset(BOSS_EXTRUDE5_START)):
        Circle(SKETCH5_R)
        Circle(SKETCH5_R_2, mode=Mode.SUBTRACT)
        with Locations((13.145843594, -18.390705049)):
            Circle(SKETCH5_R_3, mode=Mode.SUBTRACT)
        with Locations((-18.390705049, -13.145843594)):
            Circle(SKETCH5_R_3, mode=Mode.SUBTRACT)
        with Locations((-13.145843594, 18.390705049)):
            Circle(SKETCH5_R_3, mode=Mode.SUBTRACT)
        with Locations((18.390705049, 13.145843594)):
            Circle(SKETCH5_R_3, mode=Mode.SUBTRACT)
    extrude(amount=-BOSS_EXTRUDE5_DEPTH)


solid = part.part
